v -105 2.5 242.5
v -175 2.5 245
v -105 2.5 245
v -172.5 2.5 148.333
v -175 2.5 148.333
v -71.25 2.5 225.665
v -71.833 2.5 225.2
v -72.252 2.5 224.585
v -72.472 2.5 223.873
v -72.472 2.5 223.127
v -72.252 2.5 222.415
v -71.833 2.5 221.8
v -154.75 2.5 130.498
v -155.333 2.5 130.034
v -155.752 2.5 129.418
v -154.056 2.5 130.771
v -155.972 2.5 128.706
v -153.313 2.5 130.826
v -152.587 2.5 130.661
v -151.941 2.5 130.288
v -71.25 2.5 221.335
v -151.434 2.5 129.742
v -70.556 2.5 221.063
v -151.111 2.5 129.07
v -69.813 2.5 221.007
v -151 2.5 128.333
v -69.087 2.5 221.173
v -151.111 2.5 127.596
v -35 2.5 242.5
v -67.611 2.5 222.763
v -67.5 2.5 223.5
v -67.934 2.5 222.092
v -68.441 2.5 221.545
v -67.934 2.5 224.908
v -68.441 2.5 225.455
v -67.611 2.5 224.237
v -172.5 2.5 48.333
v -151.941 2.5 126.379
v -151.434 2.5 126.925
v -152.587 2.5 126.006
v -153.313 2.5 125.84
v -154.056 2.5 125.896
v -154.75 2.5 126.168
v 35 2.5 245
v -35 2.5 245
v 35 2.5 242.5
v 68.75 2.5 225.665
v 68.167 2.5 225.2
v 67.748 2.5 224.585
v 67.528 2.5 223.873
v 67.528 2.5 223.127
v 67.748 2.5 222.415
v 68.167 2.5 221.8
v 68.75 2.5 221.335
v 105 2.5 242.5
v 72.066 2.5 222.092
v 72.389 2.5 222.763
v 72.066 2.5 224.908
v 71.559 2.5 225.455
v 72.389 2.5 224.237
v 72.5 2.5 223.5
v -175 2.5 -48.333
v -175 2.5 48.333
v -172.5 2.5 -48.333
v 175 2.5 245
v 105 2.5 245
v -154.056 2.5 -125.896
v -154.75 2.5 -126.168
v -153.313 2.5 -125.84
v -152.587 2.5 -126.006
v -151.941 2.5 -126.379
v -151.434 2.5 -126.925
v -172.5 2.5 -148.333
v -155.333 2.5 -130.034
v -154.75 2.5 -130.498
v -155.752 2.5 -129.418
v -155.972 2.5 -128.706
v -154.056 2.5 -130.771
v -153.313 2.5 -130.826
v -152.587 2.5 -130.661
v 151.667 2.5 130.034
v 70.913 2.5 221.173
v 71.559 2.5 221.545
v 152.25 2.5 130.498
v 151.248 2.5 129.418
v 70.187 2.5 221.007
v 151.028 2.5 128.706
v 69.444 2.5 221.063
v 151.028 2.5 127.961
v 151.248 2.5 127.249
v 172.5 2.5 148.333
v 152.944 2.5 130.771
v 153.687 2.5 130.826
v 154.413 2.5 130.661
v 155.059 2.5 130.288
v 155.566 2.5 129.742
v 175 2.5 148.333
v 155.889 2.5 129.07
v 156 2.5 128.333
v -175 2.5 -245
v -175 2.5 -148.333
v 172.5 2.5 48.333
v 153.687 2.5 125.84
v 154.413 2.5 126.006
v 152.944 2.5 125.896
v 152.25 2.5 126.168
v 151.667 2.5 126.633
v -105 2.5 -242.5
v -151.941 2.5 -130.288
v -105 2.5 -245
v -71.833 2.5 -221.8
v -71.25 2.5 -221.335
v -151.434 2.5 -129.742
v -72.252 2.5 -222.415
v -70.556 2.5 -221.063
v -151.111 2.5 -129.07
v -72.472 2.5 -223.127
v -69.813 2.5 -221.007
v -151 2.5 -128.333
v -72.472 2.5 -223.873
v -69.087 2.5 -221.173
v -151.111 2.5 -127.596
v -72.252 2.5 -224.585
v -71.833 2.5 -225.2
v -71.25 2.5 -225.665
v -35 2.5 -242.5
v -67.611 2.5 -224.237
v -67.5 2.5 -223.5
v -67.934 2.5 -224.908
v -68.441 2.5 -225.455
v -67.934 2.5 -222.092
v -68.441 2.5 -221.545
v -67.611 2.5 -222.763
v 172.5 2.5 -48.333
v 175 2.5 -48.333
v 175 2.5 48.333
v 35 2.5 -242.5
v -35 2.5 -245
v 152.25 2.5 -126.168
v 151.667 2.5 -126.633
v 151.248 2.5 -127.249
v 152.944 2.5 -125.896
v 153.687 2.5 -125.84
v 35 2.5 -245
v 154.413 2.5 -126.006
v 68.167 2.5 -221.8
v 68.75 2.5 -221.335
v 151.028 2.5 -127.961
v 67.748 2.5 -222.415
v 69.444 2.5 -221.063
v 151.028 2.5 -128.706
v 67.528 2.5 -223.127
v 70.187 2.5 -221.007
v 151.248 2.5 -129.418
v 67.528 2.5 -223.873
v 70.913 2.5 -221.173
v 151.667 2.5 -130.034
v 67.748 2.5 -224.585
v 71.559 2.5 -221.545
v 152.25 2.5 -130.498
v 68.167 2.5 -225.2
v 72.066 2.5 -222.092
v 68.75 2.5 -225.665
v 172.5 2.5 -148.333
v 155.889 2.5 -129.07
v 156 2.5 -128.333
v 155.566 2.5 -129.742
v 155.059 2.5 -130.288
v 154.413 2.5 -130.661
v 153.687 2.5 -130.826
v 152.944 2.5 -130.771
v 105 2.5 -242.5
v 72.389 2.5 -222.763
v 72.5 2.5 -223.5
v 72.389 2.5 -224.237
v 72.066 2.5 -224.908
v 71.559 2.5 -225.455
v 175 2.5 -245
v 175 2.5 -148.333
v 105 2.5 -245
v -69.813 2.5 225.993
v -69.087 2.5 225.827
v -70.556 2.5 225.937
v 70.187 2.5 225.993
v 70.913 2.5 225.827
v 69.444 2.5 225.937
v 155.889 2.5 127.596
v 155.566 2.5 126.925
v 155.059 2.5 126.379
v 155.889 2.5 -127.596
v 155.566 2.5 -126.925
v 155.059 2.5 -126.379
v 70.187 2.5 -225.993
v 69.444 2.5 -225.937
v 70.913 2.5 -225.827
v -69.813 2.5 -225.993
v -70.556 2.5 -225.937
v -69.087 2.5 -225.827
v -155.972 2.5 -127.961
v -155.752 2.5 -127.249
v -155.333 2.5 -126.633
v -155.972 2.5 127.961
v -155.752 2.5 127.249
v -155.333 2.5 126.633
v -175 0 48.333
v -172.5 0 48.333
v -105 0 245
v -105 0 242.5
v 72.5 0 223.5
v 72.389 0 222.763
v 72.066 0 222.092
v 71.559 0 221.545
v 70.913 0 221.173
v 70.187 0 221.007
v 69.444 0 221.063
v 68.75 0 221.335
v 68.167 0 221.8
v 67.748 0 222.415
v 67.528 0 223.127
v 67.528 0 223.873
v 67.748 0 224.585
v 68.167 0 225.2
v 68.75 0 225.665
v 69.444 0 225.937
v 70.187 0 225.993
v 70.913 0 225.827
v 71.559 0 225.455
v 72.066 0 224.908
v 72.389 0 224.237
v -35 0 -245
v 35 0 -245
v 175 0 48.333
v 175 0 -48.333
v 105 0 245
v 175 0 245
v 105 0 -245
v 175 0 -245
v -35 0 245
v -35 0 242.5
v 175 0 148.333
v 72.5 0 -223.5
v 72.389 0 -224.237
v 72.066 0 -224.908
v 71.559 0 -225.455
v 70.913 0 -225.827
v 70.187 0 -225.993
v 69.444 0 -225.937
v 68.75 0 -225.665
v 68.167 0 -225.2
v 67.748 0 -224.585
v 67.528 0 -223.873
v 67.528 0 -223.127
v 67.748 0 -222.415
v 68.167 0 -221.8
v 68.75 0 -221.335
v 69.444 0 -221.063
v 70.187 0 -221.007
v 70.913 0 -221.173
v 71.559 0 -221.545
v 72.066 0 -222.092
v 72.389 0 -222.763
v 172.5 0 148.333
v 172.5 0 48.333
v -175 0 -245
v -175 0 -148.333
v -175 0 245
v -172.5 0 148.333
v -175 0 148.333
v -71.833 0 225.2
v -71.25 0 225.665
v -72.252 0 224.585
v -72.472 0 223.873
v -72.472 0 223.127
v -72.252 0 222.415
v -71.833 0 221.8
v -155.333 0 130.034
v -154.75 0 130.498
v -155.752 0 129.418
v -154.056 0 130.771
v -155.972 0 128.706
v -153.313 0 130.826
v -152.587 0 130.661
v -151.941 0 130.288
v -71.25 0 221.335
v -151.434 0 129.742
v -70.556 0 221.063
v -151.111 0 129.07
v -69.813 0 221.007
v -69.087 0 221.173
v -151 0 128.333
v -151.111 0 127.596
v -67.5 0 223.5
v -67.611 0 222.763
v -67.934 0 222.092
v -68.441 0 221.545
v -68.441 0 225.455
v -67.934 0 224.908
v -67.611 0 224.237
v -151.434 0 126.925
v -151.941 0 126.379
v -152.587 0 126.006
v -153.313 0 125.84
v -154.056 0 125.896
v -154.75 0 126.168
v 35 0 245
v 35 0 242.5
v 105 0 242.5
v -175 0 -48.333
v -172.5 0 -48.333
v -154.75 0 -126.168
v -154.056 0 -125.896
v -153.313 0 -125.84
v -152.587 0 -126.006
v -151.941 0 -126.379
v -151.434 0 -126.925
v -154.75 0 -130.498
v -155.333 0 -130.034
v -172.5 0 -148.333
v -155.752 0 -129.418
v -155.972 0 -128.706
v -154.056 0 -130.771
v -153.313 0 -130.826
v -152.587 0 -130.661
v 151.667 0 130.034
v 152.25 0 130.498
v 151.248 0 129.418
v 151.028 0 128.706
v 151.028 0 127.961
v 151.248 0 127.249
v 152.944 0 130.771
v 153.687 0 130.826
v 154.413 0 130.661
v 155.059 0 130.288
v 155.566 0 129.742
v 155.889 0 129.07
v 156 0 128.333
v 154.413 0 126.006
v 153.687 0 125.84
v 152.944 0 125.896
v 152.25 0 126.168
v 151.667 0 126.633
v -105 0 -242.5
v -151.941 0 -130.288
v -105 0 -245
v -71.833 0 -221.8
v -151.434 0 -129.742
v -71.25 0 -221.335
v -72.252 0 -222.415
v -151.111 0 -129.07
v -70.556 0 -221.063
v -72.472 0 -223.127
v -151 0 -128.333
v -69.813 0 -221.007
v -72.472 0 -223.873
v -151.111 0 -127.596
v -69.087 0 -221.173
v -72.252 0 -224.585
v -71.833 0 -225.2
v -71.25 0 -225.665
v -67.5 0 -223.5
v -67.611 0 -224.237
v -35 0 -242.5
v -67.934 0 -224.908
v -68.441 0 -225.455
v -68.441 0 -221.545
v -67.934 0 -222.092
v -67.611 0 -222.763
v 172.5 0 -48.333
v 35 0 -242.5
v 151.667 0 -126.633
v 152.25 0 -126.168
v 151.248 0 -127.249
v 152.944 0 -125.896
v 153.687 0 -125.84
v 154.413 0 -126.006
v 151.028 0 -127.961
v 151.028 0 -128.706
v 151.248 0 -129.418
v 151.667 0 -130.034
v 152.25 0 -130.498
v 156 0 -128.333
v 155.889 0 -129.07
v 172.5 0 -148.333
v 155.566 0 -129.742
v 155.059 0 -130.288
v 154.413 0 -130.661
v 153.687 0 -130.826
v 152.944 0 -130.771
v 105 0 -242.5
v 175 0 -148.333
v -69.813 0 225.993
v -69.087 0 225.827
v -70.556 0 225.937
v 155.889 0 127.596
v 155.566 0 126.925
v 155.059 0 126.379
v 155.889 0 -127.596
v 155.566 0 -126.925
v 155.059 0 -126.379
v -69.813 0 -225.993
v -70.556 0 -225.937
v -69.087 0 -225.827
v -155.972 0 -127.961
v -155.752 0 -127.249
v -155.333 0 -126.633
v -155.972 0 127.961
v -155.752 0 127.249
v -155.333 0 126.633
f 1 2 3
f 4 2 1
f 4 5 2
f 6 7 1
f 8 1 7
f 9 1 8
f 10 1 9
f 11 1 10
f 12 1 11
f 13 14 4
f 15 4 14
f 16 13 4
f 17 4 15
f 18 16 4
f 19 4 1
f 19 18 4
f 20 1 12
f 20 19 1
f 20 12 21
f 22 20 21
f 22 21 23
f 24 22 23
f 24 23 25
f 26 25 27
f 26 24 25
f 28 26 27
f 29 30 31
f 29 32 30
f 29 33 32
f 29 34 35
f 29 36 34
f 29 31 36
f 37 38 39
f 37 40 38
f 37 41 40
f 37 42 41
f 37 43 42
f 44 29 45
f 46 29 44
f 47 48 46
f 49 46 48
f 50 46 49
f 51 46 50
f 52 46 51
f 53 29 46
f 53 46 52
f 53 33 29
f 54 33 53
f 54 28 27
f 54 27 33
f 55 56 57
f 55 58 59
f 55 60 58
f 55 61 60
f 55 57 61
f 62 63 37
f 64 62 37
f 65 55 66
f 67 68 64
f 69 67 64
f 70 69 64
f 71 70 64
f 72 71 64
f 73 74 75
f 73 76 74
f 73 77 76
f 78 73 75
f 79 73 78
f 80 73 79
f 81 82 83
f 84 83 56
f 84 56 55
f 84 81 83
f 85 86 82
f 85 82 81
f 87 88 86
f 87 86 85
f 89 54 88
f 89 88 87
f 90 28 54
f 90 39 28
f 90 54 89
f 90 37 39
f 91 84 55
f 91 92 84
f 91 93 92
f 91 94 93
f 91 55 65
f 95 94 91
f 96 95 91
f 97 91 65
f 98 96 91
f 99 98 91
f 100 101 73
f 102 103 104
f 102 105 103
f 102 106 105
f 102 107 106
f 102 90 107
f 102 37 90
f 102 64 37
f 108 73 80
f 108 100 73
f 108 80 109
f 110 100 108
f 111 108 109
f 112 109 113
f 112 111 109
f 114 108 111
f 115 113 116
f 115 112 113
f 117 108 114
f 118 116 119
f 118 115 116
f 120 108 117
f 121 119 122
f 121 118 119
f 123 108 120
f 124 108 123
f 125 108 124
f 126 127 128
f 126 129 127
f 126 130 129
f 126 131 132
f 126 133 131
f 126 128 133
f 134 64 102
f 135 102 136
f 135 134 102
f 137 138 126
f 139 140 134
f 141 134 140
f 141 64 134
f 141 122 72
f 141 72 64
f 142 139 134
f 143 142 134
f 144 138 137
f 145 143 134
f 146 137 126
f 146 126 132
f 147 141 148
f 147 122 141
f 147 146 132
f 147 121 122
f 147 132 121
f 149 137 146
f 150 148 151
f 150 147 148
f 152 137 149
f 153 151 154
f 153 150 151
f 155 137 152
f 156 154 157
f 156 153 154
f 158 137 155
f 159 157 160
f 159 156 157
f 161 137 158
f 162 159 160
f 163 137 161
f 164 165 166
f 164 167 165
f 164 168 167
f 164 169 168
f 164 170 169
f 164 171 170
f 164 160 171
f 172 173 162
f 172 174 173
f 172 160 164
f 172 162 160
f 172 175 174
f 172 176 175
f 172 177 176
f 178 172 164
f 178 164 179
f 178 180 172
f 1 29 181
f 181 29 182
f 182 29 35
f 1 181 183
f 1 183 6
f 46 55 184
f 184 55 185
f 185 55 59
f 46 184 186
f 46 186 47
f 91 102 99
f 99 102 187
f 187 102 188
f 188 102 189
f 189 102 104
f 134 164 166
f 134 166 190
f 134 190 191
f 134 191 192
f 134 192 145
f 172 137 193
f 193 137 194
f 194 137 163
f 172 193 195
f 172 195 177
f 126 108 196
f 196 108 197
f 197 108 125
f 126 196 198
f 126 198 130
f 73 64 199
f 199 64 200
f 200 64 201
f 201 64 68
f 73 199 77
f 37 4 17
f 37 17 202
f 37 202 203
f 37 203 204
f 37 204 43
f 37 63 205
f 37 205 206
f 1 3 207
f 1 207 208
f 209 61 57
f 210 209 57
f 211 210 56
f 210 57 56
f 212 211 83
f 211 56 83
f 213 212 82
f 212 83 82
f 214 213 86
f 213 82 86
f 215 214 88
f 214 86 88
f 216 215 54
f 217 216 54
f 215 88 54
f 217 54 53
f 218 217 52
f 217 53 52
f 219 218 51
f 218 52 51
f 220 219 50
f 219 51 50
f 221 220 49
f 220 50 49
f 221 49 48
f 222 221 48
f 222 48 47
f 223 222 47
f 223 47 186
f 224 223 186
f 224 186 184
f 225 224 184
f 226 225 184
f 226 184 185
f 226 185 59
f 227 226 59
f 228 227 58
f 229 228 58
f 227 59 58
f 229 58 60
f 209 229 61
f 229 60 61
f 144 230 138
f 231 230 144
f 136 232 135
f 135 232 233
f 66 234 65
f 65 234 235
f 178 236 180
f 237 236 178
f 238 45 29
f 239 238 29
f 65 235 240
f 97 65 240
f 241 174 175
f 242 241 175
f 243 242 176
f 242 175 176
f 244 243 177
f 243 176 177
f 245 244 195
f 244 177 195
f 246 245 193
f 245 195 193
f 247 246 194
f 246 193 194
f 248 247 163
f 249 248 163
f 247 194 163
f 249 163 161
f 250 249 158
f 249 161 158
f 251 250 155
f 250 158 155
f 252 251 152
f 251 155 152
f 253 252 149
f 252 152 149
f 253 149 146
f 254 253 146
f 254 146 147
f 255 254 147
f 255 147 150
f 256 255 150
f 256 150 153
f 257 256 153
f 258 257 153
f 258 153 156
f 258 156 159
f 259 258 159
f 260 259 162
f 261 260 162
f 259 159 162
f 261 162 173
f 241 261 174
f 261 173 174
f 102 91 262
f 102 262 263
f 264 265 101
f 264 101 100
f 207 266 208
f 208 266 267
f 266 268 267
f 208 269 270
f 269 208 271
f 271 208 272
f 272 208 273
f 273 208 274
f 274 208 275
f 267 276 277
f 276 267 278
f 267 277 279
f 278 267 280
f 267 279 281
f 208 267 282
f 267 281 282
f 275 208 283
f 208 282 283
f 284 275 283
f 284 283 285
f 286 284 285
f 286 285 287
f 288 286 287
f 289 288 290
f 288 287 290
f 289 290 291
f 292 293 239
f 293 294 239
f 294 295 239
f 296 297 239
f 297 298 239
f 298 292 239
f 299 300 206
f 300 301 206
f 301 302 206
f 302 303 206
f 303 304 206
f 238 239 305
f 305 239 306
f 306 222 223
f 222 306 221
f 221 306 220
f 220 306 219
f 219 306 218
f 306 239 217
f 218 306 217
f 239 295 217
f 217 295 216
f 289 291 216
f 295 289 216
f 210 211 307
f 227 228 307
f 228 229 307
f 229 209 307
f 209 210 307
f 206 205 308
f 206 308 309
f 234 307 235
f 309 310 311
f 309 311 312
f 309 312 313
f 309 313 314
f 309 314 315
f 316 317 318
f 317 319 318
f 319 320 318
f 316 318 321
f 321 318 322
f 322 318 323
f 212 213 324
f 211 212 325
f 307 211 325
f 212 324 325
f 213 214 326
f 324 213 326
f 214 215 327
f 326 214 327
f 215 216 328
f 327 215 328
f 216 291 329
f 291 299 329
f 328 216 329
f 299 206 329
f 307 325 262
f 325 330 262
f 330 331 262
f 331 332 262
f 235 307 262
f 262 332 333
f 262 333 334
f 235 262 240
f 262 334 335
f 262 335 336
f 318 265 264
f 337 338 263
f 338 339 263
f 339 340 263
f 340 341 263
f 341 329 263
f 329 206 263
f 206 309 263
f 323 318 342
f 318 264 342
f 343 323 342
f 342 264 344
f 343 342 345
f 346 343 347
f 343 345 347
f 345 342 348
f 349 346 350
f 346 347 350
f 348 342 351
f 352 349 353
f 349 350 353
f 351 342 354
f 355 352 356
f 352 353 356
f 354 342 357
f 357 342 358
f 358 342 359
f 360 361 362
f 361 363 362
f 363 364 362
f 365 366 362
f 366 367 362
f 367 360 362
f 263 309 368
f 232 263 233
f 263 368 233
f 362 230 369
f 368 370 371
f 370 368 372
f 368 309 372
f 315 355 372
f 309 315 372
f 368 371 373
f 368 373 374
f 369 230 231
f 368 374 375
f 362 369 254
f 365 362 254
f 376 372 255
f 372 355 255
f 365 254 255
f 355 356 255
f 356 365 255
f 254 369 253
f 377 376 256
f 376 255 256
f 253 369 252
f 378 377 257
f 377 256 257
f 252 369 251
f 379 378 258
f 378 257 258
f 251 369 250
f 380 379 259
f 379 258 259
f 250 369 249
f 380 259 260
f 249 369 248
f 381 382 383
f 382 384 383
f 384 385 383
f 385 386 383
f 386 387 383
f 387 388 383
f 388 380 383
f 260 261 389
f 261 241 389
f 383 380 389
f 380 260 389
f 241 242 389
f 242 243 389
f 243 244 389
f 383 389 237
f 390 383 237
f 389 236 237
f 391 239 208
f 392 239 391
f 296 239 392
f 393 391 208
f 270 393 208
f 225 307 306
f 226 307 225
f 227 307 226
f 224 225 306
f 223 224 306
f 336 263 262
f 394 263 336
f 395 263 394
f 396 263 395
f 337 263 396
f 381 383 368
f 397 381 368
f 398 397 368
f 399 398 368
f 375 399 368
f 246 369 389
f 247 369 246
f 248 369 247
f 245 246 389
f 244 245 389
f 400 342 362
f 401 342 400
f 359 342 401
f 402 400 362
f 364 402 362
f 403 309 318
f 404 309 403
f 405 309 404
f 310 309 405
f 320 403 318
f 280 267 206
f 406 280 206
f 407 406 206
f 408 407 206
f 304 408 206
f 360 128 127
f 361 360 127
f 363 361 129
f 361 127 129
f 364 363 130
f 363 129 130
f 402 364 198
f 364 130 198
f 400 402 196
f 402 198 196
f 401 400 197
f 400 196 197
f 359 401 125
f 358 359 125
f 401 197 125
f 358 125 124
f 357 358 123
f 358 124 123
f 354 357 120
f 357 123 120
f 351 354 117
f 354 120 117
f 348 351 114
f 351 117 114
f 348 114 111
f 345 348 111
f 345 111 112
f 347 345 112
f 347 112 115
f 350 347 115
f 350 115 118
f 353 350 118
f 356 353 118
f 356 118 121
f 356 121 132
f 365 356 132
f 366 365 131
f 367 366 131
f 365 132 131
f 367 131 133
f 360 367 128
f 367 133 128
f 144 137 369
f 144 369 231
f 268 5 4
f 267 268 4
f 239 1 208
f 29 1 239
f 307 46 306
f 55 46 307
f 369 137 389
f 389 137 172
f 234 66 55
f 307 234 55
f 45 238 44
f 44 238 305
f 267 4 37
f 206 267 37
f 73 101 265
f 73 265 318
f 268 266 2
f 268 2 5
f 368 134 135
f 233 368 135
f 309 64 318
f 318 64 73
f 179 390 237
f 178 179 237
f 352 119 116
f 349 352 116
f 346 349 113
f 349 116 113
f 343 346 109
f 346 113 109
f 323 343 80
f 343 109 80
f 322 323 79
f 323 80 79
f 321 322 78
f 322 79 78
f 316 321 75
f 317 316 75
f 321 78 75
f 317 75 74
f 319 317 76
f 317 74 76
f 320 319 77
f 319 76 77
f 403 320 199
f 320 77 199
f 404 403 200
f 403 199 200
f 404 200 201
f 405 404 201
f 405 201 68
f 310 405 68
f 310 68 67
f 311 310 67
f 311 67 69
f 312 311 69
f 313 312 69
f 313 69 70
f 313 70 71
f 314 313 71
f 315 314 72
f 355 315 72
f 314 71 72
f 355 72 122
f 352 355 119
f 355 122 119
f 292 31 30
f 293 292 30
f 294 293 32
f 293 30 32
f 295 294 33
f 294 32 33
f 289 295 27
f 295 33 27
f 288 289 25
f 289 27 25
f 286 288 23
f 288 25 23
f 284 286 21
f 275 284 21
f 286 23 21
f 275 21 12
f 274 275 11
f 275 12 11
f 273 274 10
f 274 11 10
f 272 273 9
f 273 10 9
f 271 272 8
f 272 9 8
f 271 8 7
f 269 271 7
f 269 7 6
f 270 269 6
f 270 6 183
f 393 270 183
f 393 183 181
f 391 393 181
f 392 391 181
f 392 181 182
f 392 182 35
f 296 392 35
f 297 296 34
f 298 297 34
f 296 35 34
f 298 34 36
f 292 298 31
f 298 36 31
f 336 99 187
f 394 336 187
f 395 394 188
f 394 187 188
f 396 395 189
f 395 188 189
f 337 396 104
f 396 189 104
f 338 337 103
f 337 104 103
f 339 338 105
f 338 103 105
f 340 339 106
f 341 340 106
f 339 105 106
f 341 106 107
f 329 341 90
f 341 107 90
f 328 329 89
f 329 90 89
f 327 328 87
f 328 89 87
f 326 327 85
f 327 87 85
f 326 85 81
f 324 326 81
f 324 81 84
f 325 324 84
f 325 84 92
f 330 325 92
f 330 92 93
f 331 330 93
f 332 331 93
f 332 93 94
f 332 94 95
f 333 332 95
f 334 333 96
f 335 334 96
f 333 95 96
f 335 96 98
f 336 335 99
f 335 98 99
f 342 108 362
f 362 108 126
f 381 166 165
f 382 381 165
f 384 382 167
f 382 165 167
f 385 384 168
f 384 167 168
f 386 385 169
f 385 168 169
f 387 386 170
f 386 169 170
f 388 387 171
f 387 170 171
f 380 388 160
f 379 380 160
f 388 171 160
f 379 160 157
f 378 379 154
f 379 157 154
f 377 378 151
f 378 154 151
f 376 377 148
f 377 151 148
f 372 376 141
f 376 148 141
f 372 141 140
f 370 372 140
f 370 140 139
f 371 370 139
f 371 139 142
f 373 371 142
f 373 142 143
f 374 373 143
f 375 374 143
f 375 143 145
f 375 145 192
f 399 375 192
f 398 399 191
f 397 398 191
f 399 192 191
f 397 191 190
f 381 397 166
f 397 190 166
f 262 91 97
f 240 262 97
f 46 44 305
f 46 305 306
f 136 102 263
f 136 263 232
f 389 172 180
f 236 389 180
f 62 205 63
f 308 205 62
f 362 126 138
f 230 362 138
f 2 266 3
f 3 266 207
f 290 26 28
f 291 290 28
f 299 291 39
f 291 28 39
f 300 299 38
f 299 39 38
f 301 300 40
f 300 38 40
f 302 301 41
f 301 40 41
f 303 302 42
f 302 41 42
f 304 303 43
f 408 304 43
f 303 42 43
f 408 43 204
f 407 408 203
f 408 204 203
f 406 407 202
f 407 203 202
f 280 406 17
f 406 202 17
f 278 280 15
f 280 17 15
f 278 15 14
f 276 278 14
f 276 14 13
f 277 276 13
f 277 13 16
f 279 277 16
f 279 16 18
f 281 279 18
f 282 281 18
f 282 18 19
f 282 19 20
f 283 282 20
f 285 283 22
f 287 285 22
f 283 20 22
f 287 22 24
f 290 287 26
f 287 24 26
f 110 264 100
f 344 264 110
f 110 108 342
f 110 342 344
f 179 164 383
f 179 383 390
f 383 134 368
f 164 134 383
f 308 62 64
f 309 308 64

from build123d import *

# Parameters (mm, degrees)
SKETCH1_W           = 350
SKETCH1_H           = 490
BOSS_EXTRUDE1_DEPTH = 2.5
SKETCH2_R           = 2.5
SKETCH2_W           = 70
SKETCH2_H           = 2.5
SKETCH2_W_2         = 2.5
SKETCH2_H_2         = 100
CUT_EXTRUDE1_DEPTH  = 2.5


with BuildPart() as part:
    # Sketch1 → Boss-Extrude1 (new body)
    with BuildSketch(Plane(origin=(0, 0, 0), x_dir=(1, 0, 0), z_dir=(0, 1, 0))):
        Rectangle(SKETCH1_W, SKETCH1_H)
    extrude(amount=BOSS_EXTRUDE1_DEPTH)

    # Sketch2 → Cut-Extrude1 (cut)
    with BuildSketch(Plane(origin=(0, 2.5, 0), x_dir=(1, 0, 0), z_dir=(0, 1, 0))):
        with Locations((70, 223.5)):
            Circle(SKETCH2_R)
        with Locations((-70, 223.5)):
            Circle(SKETCH2_R)
        with Locations((70, -223.5)):
            Circle(SKETCH2_R)
        with Locations((-70, -223.5)):
            Circle(SKETCH2_R)
        with Locations((153.5, 128.333333333)):
            Circle(SKETCH2_R)
        with Locations((153.5, -128.333333333)):
            Circle(SKETCH2_R)
        with Locations((-153.5, -128.333333333)):
            Circle(SKETCH2_R)
        with Locations((-153.5, 128.333333333)):
            Circle(SKETCH2_R)
        with Locations((-70, 243.75)):
            Rectangle(SKETCH2_W, SKETCH2_H)
        with Locations((-173.75, 98.333333333)):
            Rectangle(SKETCH2_W_2, SKETCH2_H_2)
        with Locations((70, 243.75)):
            Rectangle(SKETCH2_W, SKETCH2_H)
        with Locations((-173.75, -98.333333333)):
            Rectangle(SKETCH2_W_2, SKETCH2_H_2)
        with Locations((173.75, -98.333333333)):
            Rectangle(SKETCH2_W_2, SKETCH2_H_2)
        with Locations((173.75, 98.333333333)):
            Rectangle(SKETCH2_W_2, SKETCH2_H_2)
        with Locations((70, -243.75)):
            Rectangle(SKETCH2_W, SKETCH2_H)
        with Locations((-70, -243.75)):
            Rectangle(SKETCH2_W, SKETCH2_H)
    extrude(amount=-CUT_EXTRUDE1_DEPTH, mode=Mode.SUBTRACT)


solid = part.part
